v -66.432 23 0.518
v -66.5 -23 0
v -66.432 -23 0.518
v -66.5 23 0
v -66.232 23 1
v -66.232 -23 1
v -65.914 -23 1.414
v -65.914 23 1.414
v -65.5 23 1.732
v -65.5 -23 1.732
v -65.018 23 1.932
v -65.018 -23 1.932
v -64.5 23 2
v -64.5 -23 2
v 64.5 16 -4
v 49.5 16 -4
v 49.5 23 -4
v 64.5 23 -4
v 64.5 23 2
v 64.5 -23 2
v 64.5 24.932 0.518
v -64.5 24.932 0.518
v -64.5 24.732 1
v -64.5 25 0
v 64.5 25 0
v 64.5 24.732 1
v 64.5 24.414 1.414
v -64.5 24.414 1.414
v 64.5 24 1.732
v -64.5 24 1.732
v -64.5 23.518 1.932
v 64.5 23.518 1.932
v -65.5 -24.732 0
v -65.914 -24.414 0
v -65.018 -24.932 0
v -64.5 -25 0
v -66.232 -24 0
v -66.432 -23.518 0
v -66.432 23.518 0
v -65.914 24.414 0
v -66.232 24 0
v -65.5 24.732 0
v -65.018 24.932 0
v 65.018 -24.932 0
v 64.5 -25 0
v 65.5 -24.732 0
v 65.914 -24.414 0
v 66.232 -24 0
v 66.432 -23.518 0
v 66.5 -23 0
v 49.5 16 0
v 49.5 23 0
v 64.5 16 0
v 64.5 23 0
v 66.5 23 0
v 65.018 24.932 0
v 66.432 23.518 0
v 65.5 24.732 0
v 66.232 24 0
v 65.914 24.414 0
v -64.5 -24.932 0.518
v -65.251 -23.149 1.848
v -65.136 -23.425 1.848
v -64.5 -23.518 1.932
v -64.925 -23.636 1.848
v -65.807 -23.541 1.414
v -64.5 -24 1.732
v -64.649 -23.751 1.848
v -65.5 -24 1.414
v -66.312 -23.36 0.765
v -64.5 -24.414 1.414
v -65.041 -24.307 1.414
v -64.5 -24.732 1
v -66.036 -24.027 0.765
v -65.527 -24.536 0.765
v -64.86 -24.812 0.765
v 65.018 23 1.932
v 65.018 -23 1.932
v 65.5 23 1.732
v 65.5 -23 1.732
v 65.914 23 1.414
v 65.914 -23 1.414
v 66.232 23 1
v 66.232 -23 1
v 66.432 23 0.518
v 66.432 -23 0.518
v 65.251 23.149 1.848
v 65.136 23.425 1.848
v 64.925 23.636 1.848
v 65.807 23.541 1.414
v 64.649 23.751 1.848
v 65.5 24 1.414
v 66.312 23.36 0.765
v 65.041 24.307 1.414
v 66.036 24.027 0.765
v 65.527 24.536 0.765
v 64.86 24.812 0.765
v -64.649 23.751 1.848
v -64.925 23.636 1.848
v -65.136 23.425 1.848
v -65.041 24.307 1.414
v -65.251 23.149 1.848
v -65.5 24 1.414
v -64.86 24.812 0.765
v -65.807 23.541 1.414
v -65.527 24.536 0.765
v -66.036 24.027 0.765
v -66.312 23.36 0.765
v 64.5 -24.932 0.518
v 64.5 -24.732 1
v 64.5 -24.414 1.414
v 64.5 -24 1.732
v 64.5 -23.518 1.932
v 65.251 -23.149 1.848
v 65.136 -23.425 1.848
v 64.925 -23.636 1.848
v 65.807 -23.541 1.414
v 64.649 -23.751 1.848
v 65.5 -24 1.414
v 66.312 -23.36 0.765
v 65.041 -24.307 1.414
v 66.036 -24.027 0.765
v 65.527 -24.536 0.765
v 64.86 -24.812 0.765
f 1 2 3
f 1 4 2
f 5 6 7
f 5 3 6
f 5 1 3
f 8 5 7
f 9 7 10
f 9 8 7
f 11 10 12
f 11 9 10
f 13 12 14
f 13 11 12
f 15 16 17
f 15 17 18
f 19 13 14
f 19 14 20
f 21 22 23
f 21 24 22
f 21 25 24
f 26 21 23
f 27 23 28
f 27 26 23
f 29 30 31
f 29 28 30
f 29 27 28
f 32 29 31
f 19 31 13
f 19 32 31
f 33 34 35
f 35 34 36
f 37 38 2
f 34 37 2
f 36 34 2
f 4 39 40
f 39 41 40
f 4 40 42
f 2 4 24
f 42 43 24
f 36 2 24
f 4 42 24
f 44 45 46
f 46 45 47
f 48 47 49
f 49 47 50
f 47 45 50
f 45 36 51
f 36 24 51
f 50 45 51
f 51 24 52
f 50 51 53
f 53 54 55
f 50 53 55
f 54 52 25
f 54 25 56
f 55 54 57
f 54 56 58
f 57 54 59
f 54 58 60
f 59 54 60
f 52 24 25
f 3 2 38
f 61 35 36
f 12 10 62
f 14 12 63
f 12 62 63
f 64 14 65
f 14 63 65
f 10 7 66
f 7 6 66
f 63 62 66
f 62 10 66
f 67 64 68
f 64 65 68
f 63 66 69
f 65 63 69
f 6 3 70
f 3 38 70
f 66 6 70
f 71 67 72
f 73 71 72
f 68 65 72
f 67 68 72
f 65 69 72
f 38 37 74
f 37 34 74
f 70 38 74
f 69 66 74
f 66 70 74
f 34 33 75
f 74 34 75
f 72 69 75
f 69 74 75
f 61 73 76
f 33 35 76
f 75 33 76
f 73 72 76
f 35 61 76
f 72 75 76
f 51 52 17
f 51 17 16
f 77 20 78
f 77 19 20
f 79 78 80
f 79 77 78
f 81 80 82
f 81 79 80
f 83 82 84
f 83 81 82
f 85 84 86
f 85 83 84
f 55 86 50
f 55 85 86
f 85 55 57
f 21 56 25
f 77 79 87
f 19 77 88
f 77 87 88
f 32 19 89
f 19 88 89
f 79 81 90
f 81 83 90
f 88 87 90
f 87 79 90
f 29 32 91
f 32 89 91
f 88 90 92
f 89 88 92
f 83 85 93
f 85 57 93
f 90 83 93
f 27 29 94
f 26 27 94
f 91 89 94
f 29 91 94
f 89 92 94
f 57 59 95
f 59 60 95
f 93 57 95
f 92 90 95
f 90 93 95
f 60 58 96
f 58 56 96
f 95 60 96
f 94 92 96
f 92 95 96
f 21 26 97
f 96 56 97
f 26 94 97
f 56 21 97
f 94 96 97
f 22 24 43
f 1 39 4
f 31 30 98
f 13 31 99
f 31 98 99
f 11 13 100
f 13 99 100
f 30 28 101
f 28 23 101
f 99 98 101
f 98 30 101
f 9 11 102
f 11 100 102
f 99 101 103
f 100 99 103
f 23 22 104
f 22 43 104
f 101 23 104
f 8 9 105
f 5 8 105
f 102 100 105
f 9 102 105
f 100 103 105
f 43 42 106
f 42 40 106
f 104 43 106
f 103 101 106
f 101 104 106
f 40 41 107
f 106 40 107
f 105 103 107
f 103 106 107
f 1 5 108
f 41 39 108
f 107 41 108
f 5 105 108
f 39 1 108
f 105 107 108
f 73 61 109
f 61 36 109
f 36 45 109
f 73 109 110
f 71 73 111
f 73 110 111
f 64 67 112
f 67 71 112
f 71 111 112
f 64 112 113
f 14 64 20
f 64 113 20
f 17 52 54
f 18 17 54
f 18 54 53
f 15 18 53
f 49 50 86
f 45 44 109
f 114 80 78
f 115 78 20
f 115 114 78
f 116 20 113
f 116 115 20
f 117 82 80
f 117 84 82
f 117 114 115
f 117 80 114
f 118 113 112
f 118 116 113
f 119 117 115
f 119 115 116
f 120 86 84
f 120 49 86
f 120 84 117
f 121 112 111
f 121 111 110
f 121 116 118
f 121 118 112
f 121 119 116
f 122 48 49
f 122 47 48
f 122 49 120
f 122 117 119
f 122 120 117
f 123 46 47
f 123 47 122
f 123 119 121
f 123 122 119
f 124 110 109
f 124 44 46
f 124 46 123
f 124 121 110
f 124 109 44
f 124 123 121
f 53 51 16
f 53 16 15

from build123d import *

# Parameters (mm, degrees)
F0_W     = 133
F0_H     = 50
F1_DEPTH = 2
F2_W     = 15
F2_H     = 7
F3_DEPTH = 4
F4_R     = 1.99999


# Not quite as in the source:
# - a fillet or chamfer is up to 0.001 mm smaller than in the source, because OpenCascade refuses the exact size


with BuildPart() as f1:
    # F0 (on Top) → F1 (new body)
    with BuildSketch(Plane.XY):
        Rectangle(F0_W, F0_H)
    extrude(amount=F1_DEPTH)

    # F2 (on face) → F3 (join)
    with BuildSketch(Plane(origin=(0, 0, 0), x_dir=(1, 0, 0), z_dir=(0, 0, -1))):
        with Locations((57, -19.5)):
            Rectangle(F2_W, F2_H)
    extrude(amount=F3_DEPTH)

    # F4 (radius 2 in the source; OpenCascade refuses exactly that, so slightly less here)
    f4_edges = [f1.edges().sort_by_distance(p)[0] for p in [
        (66.5, 25, 1),
        (66.5, -25, 1),
        (-66.5, 25, 1),
        (-66.5, -25, 1),
        (66.5, 0, 2),
        (0, 25, 2),
        (-66.5, 0, 2),
        (0, -25, 2),
    ]]
    fillet(f4_edges, radius=F4_R)


solid = f1.part
